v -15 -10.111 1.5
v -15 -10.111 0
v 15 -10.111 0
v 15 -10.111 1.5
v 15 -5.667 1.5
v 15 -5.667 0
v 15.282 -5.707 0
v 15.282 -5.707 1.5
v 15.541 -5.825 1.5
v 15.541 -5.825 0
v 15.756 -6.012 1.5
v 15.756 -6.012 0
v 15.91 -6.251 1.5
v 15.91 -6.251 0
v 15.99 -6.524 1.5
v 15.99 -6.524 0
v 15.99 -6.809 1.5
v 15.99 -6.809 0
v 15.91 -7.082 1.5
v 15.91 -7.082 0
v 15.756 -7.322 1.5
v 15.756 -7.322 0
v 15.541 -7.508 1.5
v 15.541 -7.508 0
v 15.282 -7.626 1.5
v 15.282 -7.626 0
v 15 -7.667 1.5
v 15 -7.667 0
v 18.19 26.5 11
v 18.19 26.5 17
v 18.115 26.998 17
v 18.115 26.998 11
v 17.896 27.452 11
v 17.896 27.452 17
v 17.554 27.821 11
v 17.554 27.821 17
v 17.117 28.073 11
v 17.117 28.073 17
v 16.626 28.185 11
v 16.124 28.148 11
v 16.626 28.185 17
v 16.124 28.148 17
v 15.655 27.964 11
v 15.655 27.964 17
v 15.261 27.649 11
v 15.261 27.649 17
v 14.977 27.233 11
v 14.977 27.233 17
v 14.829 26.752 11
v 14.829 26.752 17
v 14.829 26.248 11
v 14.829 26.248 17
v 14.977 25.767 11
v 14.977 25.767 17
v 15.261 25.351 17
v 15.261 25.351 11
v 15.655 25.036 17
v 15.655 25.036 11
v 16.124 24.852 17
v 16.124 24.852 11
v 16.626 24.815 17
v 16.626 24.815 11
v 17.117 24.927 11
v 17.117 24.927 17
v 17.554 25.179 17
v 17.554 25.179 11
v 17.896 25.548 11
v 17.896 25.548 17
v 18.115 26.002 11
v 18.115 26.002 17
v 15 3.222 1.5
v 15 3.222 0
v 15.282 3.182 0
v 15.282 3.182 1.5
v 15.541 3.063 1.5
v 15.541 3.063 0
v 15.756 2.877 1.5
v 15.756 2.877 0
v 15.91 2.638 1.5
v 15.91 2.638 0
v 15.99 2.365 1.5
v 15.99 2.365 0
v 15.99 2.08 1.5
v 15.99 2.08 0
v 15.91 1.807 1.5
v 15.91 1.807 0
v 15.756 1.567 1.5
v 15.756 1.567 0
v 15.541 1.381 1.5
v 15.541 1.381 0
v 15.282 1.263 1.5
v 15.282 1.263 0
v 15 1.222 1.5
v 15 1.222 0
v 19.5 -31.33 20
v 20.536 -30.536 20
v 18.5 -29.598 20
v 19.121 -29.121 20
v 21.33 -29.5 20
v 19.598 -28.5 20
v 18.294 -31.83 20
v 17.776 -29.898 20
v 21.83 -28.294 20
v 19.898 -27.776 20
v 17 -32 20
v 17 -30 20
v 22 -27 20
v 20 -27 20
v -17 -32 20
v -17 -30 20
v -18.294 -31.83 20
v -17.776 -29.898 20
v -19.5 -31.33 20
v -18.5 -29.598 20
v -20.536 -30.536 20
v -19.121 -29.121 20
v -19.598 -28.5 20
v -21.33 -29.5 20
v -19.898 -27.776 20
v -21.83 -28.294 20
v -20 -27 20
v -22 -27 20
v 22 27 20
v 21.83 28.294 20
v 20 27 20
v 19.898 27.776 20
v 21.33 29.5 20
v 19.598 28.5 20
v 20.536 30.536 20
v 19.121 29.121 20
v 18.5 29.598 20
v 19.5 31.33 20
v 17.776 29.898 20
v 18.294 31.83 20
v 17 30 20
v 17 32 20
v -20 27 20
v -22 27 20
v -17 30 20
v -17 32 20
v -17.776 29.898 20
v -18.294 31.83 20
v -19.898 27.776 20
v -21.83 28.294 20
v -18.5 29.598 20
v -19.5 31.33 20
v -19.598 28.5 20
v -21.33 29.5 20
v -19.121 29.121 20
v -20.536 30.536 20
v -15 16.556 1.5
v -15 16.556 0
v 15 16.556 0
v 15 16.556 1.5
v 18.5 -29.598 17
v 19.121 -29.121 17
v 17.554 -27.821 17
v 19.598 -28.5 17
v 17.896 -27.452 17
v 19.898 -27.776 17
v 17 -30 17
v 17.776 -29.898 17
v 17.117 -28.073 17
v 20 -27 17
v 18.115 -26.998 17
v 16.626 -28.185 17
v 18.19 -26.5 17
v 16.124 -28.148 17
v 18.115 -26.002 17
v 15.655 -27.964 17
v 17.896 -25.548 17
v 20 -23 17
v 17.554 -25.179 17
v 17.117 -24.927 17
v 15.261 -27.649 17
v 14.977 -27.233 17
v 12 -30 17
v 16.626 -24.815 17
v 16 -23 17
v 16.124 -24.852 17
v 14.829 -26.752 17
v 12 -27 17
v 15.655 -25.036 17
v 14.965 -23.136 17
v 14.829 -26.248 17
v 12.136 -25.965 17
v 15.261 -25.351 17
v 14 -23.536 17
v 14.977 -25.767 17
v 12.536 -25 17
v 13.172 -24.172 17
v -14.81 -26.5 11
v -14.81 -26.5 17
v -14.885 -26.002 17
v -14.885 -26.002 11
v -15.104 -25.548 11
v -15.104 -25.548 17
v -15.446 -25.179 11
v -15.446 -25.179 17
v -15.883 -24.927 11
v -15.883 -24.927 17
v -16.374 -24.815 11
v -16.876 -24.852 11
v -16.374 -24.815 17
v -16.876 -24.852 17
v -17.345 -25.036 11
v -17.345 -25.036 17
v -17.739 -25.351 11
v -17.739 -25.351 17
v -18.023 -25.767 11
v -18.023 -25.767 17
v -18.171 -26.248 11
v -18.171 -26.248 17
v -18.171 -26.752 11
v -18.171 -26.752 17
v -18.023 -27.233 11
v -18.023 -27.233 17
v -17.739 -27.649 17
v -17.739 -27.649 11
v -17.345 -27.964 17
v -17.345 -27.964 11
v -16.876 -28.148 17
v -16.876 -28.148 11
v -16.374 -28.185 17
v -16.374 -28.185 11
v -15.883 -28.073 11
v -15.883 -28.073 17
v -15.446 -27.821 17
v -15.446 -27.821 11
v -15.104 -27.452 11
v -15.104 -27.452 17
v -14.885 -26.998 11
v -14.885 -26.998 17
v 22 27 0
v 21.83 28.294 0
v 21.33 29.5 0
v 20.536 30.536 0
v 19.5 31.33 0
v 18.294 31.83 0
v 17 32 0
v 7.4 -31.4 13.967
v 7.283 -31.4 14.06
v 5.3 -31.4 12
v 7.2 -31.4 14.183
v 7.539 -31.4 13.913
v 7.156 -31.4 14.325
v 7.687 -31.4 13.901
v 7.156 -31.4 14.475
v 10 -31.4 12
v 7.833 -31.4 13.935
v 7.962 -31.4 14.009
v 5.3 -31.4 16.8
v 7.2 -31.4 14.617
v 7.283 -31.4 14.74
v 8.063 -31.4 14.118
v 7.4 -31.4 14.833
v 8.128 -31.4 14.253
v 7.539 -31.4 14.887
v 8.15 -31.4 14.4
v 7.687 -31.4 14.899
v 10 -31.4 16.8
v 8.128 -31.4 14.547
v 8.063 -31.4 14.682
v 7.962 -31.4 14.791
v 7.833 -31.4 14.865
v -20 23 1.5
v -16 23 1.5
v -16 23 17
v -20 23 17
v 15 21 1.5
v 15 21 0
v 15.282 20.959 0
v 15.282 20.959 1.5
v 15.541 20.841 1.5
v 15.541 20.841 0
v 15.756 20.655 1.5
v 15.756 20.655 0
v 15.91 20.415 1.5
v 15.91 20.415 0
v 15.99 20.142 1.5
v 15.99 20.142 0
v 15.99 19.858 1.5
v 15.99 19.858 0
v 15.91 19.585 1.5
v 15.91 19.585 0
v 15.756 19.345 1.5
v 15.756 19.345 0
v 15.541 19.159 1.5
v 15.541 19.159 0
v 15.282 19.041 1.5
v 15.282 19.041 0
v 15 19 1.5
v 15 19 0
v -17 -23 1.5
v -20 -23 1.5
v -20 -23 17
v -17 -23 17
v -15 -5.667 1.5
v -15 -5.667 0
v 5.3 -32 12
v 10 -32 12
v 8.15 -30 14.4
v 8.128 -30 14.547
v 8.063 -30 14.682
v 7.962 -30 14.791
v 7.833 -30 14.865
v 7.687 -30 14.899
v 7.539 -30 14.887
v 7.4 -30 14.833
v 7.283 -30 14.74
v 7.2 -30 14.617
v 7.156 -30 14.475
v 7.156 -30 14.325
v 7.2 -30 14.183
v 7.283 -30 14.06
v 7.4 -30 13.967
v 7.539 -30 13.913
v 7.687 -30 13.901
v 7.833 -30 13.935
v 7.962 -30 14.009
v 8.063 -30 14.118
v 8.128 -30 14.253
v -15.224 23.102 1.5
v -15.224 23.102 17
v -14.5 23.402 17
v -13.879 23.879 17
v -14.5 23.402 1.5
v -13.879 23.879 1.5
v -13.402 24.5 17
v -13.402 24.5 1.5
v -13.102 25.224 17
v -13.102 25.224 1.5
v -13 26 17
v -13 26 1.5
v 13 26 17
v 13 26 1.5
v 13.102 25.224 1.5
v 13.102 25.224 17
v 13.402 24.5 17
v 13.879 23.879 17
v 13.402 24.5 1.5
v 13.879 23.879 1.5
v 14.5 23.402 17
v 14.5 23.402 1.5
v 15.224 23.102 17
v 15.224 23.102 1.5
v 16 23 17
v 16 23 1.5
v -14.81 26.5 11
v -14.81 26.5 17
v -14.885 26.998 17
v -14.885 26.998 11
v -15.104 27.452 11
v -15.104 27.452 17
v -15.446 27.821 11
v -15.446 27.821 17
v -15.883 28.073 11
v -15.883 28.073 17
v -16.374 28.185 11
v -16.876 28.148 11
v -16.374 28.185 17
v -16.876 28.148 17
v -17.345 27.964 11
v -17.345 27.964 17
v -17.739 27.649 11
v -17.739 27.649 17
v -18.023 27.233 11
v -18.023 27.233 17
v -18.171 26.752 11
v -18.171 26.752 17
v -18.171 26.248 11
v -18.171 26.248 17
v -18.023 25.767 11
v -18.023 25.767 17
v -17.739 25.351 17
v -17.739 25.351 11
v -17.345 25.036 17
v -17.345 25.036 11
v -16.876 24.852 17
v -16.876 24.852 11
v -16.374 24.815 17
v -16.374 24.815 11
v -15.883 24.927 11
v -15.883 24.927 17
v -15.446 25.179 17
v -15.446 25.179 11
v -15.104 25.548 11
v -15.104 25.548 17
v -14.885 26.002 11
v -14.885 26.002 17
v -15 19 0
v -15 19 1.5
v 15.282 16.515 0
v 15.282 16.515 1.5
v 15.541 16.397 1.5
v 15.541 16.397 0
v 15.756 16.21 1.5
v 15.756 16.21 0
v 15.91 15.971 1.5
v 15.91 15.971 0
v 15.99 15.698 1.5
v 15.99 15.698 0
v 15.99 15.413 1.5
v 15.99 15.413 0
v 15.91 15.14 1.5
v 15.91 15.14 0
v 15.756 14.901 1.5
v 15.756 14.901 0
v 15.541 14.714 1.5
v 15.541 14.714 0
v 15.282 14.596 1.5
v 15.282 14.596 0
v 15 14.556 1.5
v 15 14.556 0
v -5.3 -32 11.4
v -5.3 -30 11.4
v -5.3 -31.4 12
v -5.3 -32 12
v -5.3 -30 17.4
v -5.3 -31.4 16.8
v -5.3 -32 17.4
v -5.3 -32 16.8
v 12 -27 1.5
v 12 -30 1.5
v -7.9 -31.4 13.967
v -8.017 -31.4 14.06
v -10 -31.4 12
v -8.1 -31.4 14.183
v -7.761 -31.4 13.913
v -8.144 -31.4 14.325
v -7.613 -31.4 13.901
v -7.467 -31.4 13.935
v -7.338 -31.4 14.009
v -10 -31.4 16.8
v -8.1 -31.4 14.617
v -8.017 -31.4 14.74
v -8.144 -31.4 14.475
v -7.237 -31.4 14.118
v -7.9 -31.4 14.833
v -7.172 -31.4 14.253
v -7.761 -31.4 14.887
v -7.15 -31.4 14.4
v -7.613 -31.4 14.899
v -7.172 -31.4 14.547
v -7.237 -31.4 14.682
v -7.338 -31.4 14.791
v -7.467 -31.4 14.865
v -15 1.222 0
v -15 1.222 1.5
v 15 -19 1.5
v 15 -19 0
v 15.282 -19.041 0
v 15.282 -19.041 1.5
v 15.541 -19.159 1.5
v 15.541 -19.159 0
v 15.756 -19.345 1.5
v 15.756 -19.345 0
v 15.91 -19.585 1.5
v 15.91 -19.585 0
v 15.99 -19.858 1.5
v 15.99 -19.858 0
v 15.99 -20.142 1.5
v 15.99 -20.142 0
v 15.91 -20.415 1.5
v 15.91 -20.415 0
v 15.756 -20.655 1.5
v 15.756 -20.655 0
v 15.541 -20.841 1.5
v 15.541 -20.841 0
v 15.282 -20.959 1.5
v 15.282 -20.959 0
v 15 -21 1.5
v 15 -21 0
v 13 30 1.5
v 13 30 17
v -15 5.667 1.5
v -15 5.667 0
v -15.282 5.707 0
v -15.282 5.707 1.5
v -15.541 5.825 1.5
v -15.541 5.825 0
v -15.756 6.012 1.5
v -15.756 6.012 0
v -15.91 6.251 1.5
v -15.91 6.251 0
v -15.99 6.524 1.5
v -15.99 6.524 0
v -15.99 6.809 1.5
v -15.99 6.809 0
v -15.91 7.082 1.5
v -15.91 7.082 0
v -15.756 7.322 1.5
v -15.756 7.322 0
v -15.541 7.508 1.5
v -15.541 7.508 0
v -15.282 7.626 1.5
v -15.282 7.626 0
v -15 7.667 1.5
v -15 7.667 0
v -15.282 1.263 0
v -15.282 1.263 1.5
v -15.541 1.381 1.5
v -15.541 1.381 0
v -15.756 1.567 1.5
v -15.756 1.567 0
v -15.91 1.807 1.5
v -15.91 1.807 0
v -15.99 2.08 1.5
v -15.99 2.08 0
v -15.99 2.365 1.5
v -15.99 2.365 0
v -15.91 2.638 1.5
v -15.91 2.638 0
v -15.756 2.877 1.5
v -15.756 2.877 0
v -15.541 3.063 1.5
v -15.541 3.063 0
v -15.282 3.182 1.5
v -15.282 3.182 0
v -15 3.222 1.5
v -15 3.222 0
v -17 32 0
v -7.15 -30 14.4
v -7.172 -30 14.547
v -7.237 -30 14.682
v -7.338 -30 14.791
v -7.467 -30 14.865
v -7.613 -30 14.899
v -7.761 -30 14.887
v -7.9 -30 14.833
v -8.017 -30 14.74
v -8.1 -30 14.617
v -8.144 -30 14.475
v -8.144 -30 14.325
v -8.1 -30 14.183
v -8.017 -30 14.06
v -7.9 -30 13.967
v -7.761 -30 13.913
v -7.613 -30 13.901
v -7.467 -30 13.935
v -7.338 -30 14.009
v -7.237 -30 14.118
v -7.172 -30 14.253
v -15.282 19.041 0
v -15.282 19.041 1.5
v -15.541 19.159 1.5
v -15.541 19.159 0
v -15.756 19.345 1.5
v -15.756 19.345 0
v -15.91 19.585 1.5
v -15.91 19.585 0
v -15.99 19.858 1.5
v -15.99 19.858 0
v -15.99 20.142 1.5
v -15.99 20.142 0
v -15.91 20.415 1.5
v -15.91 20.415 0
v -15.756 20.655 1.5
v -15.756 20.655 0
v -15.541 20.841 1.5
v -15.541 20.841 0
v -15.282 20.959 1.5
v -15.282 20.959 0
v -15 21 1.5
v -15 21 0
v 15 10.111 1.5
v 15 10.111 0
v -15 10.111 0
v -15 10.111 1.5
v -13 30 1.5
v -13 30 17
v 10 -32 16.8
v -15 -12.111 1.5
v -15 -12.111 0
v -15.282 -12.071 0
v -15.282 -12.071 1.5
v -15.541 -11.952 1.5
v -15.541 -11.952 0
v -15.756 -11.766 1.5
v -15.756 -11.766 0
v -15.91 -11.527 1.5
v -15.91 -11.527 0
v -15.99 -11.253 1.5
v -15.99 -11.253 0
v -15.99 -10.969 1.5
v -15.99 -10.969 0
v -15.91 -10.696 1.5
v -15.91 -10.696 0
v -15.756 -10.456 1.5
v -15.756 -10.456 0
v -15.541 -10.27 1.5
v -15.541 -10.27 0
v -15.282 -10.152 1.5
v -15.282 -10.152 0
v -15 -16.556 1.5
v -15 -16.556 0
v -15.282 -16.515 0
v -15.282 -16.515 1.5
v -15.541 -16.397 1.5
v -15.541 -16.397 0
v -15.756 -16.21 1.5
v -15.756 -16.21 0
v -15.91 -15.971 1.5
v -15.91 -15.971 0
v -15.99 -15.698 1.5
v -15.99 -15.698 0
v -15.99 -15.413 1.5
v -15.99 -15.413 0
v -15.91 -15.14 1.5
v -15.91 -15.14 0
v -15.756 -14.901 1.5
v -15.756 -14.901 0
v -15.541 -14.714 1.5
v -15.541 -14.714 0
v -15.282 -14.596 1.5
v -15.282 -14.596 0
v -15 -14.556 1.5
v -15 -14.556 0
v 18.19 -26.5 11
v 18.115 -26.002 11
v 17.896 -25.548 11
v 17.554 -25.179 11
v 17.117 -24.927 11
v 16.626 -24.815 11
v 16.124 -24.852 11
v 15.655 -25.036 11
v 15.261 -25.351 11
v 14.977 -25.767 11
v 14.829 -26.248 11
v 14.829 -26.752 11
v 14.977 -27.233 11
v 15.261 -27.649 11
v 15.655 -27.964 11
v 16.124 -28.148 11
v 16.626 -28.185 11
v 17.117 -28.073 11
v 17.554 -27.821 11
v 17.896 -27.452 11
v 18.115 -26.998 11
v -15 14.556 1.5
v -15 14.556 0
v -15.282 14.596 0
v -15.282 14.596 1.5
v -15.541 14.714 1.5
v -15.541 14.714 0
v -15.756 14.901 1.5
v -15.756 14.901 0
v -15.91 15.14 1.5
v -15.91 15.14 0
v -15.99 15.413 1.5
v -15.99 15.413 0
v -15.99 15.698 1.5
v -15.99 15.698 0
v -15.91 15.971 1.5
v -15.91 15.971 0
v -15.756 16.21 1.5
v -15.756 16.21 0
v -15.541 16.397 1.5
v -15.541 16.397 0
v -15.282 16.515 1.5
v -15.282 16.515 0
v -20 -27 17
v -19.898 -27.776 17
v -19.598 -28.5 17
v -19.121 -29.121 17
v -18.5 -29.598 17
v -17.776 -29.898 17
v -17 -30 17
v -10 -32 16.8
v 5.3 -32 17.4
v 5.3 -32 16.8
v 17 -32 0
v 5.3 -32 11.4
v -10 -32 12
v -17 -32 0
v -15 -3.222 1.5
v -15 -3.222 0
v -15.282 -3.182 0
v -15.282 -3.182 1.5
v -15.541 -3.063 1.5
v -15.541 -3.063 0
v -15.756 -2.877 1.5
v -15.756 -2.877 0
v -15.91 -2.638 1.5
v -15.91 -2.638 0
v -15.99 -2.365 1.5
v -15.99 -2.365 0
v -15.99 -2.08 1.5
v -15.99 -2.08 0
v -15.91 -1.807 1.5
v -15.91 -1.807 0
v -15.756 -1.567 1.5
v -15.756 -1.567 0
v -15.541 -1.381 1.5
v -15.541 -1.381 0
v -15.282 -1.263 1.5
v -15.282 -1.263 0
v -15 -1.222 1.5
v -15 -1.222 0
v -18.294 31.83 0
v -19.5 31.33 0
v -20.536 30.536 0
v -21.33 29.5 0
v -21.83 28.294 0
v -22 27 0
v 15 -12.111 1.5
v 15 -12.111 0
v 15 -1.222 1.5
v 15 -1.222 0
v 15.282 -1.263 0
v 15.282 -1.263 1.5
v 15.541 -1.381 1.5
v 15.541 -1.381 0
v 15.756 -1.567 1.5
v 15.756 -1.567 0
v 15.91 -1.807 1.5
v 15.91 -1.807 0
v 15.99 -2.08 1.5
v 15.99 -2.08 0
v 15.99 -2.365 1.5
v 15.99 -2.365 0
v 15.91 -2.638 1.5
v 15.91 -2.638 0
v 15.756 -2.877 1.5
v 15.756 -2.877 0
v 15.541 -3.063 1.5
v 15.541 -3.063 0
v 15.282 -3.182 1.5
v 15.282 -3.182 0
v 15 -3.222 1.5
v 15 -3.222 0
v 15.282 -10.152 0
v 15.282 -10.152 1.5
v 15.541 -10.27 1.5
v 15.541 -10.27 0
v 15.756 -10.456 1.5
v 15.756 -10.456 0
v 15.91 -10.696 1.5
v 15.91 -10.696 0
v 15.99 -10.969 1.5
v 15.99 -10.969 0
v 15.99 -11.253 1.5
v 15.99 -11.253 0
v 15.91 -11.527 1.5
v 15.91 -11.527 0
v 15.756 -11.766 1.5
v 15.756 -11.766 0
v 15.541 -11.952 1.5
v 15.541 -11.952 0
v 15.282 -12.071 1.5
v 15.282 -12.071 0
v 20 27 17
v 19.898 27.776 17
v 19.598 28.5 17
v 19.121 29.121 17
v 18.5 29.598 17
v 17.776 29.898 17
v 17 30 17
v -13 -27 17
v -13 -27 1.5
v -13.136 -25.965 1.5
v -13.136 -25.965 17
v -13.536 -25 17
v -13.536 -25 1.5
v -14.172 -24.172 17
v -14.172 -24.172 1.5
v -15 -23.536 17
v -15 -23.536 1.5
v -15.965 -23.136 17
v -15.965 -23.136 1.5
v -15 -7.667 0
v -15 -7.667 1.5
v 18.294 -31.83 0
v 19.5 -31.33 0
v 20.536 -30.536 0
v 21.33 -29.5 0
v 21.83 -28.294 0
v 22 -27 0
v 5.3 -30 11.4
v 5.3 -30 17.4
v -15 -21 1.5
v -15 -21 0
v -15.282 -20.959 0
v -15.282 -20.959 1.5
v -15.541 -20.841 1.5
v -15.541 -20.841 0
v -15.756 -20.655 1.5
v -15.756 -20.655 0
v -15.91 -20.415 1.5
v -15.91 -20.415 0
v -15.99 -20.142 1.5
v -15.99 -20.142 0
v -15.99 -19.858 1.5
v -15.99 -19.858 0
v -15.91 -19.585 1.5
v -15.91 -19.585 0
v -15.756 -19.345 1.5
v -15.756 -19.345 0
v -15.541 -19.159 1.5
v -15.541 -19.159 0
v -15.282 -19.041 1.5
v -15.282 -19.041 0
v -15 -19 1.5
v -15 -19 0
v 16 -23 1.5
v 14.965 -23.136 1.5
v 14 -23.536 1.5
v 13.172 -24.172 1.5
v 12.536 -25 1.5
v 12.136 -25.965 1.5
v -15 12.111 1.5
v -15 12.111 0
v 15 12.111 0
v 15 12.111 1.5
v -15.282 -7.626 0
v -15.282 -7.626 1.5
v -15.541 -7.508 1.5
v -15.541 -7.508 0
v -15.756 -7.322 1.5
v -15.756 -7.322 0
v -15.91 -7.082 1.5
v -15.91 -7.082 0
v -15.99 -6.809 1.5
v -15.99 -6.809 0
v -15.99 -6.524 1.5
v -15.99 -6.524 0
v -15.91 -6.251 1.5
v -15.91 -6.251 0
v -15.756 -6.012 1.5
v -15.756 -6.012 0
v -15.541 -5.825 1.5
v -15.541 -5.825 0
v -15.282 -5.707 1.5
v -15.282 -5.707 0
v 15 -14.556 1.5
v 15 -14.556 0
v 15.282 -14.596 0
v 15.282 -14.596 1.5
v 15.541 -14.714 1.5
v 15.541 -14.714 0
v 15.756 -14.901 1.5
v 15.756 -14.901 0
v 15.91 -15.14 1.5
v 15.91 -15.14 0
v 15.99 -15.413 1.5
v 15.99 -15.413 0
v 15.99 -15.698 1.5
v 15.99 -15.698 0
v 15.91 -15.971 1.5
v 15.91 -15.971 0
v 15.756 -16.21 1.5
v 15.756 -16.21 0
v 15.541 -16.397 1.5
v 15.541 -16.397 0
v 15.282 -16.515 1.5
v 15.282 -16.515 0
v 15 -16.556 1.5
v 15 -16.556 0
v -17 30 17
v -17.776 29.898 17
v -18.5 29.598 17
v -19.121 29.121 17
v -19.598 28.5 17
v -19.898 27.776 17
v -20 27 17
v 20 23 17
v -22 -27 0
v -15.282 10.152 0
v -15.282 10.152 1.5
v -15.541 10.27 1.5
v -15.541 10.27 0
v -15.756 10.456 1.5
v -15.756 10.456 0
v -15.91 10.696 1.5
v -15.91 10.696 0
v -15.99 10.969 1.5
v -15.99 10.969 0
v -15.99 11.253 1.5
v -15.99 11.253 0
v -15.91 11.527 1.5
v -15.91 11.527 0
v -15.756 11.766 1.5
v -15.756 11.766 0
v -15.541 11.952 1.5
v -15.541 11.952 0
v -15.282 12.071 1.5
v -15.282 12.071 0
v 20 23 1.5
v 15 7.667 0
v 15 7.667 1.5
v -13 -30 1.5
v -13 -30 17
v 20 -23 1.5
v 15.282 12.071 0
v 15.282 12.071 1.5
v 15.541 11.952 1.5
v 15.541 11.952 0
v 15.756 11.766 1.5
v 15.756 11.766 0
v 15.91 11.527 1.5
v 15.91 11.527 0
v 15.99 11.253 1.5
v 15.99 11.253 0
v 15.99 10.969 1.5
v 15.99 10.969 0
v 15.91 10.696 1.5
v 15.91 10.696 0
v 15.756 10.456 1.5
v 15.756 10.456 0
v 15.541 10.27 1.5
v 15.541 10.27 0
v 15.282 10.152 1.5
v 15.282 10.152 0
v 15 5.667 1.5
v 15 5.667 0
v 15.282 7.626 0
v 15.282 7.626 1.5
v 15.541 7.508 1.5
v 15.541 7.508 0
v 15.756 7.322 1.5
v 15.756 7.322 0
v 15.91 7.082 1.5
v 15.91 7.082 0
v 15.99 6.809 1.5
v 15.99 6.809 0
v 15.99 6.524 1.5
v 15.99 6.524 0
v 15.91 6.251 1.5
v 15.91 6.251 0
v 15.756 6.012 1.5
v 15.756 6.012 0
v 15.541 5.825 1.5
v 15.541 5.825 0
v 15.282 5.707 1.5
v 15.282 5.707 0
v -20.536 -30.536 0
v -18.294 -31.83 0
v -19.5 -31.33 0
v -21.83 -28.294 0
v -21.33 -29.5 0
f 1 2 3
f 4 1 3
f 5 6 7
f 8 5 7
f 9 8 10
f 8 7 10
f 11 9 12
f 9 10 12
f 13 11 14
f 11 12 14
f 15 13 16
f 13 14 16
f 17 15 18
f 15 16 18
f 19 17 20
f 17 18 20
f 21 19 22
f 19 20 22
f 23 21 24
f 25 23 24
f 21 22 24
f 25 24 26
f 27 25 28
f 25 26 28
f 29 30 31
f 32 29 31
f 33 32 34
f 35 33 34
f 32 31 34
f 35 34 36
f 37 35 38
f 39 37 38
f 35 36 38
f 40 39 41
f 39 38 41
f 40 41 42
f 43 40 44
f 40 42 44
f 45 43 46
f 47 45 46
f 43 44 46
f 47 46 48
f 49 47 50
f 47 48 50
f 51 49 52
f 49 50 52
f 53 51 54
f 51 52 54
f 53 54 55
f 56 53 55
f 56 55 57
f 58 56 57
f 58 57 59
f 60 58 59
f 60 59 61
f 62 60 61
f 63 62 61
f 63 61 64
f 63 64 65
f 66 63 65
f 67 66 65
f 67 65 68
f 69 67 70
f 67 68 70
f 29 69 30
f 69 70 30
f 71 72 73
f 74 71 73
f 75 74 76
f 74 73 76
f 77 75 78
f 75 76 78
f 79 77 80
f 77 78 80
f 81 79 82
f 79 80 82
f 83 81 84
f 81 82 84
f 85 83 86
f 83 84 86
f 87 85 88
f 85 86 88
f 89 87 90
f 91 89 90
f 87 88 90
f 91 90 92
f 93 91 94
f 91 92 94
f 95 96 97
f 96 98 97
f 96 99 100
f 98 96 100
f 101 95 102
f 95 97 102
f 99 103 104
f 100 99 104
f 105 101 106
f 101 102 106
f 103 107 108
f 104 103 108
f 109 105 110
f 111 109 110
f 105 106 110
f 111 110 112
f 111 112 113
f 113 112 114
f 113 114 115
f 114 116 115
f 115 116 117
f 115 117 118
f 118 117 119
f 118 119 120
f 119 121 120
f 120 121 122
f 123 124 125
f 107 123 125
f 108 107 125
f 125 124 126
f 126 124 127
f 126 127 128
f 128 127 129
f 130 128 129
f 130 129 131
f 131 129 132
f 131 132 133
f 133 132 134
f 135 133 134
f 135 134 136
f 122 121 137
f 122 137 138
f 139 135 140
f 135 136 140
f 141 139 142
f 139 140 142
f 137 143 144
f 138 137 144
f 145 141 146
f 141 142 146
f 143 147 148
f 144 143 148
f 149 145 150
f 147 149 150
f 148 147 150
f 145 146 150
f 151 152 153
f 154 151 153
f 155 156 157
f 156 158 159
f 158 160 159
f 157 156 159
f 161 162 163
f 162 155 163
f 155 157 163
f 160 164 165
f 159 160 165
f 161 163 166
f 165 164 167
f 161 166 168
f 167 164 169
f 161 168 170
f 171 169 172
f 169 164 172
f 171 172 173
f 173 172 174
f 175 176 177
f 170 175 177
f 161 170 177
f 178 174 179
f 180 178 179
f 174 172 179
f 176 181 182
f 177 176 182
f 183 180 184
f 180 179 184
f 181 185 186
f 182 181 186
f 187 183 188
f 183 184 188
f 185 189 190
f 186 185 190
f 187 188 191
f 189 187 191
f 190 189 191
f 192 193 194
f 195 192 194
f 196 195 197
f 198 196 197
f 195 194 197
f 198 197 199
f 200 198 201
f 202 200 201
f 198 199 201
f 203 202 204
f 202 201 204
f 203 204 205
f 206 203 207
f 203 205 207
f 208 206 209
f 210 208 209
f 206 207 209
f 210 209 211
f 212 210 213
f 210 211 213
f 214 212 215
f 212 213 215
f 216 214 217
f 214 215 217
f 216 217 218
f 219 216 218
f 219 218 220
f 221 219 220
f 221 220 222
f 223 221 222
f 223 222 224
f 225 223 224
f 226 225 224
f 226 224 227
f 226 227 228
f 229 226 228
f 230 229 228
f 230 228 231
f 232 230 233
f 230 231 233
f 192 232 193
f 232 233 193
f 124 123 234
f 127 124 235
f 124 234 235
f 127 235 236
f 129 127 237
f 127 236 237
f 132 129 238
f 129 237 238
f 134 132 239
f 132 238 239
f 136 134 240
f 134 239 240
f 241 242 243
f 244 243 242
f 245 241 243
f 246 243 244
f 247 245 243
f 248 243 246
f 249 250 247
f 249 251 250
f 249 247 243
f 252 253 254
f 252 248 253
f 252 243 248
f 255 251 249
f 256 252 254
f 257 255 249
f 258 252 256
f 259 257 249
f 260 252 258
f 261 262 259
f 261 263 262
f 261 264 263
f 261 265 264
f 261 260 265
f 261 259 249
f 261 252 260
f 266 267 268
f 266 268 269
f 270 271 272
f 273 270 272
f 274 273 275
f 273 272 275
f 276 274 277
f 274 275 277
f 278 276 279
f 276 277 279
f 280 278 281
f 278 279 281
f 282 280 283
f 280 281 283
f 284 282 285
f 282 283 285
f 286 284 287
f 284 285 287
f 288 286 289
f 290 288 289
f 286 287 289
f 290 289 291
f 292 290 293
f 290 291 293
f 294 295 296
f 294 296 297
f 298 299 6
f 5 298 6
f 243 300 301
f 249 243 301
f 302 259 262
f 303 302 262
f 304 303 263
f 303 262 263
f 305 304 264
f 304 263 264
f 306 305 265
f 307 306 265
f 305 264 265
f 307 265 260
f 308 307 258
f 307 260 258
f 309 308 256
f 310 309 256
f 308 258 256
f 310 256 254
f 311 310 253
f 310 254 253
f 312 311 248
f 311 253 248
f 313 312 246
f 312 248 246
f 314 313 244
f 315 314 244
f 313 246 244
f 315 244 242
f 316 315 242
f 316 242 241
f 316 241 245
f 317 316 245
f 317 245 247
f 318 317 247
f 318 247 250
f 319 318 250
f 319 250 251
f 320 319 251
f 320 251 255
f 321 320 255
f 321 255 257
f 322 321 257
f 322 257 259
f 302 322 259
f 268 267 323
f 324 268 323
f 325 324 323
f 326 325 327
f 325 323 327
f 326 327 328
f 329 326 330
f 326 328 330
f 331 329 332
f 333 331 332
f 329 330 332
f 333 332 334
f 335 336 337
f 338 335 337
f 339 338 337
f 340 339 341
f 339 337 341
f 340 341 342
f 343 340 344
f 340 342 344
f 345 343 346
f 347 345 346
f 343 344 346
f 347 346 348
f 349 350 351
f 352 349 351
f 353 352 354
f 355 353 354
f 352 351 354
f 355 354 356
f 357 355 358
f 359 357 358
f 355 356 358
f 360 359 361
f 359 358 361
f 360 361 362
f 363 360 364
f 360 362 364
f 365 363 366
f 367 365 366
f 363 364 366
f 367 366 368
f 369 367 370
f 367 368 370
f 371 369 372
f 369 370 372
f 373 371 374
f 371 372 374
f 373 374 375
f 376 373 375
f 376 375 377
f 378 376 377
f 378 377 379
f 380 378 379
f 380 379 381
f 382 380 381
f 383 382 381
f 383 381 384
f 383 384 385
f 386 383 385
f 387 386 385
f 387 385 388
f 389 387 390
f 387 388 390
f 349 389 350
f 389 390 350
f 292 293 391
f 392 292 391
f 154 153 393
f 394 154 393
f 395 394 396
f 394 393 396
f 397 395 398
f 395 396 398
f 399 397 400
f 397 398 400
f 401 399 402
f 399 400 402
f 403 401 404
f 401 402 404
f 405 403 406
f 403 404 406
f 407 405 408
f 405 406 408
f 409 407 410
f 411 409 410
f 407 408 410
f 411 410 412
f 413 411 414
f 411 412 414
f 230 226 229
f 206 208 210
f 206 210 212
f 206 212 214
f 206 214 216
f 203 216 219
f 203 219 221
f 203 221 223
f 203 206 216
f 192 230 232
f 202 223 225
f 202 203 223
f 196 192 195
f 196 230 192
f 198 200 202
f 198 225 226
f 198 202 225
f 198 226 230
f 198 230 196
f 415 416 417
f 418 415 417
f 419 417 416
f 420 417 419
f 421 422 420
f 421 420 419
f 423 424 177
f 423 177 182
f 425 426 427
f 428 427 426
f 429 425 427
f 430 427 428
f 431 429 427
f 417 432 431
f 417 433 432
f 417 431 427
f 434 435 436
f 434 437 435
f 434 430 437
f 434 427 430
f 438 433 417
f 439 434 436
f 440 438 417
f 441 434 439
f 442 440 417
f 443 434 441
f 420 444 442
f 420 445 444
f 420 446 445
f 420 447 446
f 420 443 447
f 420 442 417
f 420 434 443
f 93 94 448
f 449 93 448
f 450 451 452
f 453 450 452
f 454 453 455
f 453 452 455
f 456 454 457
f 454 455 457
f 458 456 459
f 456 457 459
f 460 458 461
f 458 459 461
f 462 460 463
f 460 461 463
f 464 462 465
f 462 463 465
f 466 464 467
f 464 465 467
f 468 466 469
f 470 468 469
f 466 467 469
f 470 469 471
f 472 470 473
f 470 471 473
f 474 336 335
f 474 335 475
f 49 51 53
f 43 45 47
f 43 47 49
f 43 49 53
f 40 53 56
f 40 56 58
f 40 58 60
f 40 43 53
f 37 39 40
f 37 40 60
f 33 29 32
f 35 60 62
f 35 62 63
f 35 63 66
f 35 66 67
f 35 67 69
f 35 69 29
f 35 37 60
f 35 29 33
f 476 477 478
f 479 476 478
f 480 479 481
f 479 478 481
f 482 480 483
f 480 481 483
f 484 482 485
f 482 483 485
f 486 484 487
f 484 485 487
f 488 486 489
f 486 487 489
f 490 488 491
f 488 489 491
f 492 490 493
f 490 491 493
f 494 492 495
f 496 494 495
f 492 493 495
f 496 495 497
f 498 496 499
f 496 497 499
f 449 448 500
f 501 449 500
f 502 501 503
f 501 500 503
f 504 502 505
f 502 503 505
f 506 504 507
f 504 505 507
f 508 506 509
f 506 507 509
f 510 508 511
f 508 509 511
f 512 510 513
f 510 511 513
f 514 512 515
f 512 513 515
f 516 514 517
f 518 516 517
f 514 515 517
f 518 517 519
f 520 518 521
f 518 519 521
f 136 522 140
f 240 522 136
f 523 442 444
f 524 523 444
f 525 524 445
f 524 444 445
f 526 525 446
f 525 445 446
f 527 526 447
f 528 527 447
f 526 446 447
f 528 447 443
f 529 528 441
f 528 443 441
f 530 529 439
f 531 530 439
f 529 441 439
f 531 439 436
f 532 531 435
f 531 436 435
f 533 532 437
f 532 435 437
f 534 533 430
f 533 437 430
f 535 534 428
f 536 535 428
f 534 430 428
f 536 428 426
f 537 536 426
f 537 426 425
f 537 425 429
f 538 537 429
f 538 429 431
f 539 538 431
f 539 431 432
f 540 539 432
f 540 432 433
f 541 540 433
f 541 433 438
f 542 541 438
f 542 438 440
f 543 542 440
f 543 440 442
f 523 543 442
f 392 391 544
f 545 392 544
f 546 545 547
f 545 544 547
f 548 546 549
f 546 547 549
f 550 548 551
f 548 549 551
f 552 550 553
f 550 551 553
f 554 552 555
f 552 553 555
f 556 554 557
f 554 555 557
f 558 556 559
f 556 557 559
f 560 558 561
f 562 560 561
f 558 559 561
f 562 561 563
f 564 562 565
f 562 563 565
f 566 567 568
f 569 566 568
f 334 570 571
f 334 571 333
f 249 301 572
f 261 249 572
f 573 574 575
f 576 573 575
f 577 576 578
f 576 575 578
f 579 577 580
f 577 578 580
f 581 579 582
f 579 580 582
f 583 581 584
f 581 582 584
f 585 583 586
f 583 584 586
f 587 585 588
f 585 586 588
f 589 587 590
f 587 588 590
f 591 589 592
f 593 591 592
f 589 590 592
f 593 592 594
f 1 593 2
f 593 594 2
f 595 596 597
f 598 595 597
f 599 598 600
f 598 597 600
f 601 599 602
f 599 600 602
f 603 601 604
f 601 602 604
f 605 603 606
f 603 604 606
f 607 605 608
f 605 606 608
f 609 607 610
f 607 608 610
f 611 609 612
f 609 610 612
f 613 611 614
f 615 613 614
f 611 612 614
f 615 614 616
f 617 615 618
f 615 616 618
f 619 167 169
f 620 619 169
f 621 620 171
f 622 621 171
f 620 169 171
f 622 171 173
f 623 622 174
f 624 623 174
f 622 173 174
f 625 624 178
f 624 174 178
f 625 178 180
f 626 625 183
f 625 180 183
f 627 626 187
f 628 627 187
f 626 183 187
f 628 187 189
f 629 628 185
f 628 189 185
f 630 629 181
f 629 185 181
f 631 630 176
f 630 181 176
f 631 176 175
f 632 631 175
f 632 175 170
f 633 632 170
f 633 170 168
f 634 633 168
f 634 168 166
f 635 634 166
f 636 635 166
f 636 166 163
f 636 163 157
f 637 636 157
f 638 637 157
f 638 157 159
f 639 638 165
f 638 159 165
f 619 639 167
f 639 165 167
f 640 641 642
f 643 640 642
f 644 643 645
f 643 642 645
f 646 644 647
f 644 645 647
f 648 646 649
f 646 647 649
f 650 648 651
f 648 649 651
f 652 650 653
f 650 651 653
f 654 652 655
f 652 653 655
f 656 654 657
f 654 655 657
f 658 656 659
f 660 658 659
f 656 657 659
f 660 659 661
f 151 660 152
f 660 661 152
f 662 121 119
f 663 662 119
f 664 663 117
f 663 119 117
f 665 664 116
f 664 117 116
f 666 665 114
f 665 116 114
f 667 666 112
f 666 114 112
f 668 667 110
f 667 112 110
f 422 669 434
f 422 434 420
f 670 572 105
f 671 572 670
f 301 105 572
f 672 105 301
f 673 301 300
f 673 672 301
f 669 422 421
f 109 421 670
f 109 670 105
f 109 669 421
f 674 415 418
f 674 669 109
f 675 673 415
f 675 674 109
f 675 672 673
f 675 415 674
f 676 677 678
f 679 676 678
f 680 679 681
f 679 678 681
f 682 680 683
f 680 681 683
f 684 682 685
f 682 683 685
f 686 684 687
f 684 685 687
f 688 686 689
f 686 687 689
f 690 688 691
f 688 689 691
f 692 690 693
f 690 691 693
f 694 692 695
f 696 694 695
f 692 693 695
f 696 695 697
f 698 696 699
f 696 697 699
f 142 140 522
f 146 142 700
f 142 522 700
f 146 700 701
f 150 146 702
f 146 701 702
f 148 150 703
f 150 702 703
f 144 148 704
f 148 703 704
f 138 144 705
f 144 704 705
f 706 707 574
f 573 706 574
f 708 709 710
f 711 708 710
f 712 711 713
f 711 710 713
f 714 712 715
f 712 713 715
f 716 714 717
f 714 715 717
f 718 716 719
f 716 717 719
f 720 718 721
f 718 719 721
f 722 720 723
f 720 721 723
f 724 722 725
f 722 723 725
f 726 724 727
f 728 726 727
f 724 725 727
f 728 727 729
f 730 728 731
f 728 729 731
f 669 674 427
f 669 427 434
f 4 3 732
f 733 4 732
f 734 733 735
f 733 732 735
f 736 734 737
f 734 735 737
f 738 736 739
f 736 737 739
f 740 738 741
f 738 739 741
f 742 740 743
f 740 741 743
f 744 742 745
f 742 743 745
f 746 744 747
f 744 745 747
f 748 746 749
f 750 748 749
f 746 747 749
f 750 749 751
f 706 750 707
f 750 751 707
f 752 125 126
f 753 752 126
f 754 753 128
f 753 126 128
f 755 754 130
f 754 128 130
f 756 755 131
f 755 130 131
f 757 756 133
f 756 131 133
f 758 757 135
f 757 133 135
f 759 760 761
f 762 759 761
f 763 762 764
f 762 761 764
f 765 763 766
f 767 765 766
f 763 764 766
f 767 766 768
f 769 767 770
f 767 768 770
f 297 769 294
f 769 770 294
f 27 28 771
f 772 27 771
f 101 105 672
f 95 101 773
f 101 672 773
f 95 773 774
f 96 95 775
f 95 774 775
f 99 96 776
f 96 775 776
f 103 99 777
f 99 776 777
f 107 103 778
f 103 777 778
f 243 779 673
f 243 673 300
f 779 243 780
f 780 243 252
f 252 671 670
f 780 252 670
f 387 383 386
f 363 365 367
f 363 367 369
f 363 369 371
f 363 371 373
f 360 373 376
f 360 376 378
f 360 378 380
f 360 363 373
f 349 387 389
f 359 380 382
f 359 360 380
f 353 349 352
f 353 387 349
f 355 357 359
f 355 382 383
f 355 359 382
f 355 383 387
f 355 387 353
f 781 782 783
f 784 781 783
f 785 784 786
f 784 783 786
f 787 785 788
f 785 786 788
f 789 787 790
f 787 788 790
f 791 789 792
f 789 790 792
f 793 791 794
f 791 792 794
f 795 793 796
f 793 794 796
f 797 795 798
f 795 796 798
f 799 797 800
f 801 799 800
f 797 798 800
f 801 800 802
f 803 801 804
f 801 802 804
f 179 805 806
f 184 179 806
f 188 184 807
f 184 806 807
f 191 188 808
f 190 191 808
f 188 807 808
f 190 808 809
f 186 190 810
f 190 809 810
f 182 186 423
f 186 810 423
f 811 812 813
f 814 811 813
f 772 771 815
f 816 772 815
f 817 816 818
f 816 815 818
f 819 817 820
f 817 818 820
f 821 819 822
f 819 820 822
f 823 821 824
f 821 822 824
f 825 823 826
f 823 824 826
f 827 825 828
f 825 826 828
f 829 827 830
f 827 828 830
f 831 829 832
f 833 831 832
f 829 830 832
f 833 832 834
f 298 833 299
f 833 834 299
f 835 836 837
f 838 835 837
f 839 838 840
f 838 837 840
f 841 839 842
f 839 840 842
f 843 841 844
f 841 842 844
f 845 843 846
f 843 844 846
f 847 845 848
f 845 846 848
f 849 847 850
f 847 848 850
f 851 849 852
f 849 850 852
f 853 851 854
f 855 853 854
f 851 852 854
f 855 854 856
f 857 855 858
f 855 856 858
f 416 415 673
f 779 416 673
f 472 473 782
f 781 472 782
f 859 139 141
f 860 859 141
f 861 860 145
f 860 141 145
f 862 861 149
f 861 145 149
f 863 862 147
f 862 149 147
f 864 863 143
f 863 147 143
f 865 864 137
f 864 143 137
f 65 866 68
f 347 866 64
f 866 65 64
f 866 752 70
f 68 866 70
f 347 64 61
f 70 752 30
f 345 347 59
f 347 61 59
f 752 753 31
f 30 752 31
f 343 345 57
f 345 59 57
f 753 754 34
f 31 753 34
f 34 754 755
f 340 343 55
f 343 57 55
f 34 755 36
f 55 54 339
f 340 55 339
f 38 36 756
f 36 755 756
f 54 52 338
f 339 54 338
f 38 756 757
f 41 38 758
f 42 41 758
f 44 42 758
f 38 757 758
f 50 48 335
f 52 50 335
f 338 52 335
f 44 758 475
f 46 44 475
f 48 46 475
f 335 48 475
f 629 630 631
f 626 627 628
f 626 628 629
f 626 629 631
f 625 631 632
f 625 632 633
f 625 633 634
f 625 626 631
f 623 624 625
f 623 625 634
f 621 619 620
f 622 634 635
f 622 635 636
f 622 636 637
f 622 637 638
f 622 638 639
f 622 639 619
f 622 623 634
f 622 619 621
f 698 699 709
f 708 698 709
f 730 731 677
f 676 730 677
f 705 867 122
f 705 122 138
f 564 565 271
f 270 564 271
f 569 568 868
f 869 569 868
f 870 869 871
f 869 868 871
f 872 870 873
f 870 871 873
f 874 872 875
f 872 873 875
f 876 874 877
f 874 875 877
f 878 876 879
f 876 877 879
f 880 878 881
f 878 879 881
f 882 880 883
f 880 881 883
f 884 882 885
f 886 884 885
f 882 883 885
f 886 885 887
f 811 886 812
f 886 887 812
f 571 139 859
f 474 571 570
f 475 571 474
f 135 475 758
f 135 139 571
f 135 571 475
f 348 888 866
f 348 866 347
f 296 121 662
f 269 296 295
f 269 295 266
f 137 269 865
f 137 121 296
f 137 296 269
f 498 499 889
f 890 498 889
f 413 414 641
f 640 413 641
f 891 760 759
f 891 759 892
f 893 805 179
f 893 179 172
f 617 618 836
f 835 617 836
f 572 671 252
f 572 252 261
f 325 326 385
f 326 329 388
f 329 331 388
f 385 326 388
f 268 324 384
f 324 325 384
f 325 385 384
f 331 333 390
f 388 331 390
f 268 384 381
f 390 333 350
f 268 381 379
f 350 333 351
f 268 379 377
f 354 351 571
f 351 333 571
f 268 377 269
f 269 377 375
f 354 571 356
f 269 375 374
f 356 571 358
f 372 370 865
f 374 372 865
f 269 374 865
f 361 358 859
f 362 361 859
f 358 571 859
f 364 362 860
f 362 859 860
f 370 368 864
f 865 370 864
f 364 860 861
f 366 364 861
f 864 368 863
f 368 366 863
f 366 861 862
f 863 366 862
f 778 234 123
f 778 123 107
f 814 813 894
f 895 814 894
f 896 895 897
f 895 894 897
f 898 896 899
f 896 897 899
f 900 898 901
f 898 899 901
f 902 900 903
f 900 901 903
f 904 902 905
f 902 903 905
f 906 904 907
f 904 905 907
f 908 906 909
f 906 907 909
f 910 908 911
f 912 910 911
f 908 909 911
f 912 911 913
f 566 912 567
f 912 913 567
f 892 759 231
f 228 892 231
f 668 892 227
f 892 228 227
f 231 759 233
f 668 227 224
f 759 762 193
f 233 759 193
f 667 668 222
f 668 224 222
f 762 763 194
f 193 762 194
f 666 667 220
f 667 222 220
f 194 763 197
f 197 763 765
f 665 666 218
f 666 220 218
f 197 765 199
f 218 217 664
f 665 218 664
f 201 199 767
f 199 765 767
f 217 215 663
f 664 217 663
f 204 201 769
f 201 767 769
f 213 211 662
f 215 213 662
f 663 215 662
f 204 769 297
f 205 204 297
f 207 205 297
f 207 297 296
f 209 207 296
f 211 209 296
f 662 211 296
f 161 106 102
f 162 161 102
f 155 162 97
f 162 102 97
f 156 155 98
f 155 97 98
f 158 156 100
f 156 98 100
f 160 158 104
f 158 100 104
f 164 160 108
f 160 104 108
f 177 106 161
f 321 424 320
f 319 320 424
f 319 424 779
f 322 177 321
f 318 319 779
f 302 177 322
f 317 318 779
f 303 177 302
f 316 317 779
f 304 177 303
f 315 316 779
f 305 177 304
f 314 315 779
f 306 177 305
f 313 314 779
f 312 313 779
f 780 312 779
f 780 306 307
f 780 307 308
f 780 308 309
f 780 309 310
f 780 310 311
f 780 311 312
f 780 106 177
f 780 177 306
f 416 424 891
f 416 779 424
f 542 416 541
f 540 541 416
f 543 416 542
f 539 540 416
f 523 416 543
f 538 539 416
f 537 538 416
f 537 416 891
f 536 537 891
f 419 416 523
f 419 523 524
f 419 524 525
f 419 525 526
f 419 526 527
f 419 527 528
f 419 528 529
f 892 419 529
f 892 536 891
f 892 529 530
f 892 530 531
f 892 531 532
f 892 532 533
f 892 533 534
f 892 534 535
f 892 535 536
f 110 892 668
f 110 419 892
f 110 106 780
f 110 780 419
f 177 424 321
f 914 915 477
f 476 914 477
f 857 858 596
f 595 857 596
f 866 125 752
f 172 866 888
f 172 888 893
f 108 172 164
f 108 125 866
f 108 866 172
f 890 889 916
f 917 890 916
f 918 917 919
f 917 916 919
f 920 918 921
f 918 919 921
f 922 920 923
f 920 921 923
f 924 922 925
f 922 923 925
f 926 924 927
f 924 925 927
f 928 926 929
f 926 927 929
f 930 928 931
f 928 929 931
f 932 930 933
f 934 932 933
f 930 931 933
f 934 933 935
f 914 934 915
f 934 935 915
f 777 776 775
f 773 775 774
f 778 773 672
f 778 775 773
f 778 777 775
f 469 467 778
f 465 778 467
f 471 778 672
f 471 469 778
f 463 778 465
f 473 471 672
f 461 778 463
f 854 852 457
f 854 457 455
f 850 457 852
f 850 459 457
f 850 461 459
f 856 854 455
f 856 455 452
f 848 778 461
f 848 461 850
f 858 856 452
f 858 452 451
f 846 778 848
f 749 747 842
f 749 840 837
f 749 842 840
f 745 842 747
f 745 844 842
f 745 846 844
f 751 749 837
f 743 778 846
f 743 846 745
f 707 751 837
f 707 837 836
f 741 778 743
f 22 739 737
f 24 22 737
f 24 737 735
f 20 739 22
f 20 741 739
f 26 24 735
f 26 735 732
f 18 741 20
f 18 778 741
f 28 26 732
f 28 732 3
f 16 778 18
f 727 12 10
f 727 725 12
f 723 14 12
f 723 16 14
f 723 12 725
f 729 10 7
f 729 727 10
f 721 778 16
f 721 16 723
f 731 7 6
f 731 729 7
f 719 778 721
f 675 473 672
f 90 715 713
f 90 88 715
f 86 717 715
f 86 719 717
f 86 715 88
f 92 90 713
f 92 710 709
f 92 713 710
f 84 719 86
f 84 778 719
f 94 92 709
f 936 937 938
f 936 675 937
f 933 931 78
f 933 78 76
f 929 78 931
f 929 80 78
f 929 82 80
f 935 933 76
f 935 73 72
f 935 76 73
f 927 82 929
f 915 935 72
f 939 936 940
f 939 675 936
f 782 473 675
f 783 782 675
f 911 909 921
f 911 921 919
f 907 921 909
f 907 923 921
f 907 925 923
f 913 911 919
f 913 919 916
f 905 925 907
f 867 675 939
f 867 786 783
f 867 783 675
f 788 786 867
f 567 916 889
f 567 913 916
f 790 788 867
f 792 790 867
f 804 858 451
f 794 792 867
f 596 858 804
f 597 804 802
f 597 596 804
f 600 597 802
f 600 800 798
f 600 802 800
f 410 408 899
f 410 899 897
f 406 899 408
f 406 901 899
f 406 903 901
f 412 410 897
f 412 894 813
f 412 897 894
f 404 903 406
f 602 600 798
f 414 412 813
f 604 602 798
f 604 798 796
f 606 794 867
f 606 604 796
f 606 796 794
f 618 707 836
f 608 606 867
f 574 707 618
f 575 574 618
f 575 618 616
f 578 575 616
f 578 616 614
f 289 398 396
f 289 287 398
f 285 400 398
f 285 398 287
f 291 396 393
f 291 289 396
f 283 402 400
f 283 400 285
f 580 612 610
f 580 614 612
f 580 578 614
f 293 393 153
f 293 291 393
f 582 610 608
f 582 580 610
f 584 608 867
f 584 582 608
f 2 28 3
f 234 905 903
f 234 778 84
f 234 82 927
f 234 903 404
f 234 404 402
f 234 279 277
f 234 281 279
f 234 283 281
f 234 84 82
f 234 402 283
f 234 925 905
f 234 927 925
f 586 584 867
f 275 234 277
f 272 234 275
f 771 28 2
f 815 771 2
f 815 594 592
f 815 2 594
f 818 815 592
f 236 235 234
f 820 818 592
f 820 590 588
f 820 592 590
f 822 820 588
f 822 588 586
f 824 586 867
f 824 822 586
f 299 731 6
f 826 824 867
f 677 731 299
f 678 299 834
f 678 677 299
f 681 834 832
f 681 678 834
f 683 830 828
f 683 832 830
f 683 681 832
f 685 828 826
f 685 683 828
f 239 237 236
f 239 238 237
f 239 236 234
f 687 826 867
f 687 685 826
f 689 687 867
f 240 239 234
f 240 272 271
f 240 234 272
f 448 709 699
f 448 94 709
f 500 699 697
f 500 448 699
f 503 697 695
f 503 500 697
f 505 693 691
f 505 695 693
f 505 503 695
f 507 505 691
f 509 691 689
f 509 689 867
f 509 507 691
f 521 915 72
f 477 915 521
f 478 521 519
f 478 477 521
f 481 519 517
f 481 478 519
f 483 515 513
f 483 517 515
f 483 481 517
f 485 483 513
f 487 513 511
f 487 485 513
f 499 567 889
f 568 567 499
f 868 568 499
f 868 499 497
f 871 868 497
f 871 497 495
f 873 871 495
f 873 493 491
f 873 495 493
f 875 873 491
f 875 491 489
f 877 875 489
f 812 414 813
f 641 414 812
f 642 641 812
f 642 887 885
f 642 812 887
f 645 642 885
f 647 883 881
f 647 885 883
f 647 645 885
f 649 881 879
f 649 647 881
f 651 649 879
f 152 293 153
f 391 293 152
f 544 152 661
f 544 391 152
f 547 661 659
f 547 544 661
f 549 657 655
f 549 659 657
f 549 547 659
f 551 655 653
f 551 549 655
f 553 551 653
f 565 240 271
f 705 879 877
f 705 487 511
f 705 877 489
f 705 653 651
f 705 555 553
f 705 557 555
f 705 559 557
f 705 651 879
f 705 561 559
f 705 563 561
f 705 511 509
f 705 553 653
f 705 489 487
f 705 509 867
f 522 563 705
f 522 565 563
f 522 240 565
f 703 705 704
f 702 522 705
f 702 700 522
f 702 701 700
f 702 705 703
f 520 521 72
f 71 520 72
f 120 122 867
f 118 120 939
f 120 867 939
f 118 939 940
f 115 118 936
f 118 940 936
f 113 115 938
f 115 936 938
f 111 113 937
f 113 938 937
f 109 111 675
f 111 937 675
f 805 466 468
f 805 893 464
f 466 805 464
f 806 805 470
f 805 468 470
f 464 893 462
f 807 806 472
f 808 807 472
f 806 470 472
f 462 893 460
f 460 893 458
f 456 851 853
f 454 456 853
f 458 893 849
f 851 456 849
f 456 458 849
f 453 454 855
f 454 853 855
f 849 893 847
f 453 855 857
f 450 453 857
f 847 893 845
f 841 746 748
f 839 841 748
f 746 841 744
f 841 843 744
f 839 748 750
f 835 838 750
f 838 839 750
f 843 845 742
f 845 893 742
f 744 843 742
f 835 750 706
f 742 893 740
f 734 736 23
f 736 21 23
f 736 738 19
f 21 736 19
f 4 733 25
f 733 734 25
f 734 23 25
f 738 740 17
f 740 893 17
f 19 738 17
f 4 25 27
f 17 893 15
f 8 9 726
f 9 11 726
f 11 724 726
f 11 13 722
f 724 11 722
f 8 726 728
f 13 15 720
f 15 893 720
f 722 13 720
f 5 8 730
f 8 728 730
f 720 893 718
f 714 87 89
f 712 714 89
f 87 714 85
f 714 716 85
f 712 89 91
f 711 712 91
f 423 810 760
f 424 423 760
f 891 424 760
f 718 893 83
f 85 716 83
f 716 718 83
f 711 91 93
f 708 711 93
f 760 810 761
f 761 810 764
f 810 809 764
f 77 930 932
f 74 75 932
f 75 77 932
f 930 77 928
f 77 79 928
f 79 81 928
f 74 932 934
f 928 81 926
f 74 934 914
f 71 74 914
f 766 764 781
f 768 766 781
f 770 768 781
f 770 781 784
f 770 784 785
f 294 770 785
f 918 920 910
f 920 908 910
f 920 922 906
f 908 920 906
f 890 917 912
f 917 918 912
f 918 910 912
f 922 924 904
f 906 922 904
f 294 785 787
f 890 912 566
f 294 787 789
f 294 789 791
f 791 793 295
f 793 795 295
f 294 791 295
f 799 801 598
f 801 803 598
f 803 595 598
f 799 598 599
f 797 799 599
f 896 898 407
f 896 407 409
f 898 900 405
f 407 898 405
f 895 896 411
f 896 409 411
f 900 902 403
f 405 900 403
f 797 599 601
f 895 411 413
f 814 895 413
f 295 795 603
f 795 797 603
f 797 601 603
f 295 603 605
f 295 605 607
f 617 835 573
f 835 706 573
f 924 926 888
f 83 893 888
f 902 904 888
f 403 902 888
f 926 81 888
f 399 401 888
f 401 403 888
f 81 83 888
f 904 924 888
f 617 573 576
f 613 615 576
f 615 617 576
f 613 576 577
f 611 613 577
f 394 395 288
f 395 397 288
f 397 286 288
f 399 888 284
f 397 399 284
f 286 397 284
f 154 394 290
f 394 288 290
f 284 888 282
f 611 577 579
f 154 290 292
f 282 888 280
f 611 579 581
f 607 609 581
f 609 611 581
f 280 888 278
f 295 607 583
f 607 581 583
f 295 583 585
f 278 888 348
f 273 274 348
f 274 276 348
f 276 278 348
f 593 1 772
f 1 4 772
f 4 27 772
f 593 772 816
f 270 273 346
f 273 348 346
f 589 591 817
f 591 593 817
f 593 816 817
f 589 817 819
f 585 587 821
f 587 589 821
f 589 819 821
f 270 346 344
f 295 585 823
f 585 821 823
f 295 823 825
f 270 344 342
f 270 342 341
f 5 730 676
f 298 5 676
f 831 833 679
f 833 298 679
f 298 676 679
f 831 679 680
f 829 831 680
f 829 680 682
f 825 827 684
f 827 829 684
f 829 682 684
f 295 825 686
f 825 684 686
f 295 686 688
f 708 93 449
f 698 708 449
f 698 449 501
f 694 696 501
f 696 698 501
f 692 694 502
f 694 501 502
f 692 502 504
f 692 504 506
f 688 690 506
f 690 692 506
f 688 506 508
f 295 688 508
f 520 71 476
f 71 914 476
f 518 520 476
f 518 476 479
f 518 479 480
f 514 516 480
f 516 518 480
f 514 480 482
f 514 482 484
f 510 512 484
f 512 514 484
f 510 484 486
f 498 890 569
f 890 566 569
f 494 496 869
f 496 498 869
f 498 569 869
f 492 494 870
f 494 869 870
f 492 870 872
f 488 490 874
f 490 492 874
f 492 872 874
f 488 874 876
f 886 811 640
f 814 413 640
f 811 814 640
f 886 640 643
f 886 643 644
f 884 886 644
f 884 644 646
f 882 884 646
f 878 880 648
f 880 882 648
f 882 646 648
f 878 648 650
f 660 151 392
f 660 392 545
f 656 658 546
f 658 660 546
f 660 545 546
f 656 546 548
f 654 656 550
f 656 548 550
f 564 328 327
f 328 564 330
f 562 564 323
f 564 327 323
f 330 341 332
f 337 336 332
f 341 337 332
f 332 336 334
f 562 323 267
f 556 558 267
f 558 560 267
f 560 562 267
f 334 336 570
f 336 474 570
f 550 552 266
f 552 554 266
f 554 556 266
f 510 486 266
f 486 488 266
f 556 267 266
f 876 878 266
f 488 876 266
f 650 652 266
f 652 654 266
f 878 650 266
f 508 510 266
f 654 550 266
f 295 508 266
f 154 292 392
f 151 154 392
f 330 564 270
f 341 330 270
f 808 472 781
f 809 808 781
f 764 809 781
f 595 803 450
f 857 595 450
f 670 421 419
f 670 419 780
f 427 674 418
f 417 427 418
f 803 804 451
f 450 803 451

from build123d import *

# Parameters (mm, degrees)
PAD_DEPTH           = 20
POCKET_DEPTH        = 18.5
POCKET001_DEPTH     = 5
LINEARPATTERN_COUNT = 10
LINEARPATTERN_PITCH = 4.444444
PAD001_DEPTH        = 15.5
SKETCH004_R         = 1.69
POCKET002_DEPTH     = 6
SKETCH005_W         = 20
SKETCH005_H         = 4.8
POCKET003_DEPTH     = 0.6
SKETCH006_R         = 0.5
SKETCH006_W         = 10.6
SKETCH006_H         = 6
POCKET004_DEPTH     = 5


with BuildPart() as part:
    # Sketch → Pad (new body)
    with BuildSketch(Plane.XY):
        with BuildLine():
            Line((-17, 32), (17, 32))
            ThreePointArc((22, 27), (20.535534, 30.535534), (17, 32))
            Line((22, 27), (22, -27))
            ThreePointArc((17, -32), (20.535534, -30.535534), (22, -27))
            Line((17, -32), (-17, -32))
            ThreePointArc((-22, -27), (-20.535534, -30.535534), (-17, -32))
            Line((-22, -27), (-22, 27))
            ThreePointArc((-17, 32), (-20.535534, 30.535534), (-22, 27))
        make_face()
    extrude(amount=PAD_DEPTH)

    # Sketch001 (on Face10 of Pad) → Pocket (cut)
    with BuildSketch(Plane.XY.offset(20)):
        with BuildLine():
            Line((-17, 30), (17, 30))
            ThreePointArc((20, 27), (19.12132, 29.12132), (17, 30))
            Line((20, 27), (20, -27))
            ThreePointArc((17, -30), (19.12132, -29.12132), (20, -27))
            Line((17, -30), (-17, -30))
            ThreePointArc((-20, -27), (-19.12132, -29.12132), (-17, -30))
            Line((-20, -27), (-20, 27))
            ThreePointArc((-17, 30), (-19.12132, 29.12132), (-20, 27))
        make_face()
    extrude(amount=-POCKET_DEPTH, mode=Mode.SUBTRACT)

    # Sketch002 (on Face4 of Pocket) → Pocket001 (cut)
    with BuildSketch(Plane(origin=(0, 0, 0), x_dir=(1, 0, 0), z_dir=(0, 0, -1))):
        with BuildLine():
            ThreePointArc((-15, 21), (-16, 20), (-15, 19))
            Line((-15, 19), (15, 19))
            ThreePointArc((15, 19), (16, 20), (15, 21))
            Line((15, 21), (-15, 21))
        make_face()
    pocket001 = extrude(amount=-POCKET001_DEPTH, mode=Mode.SUBTRACT)

    # LinearPattern: Pocket001 ×10
    with Locations(*[(0, i * LINEARPATTERN_PITCH, 0) for i in range(1, LINEARPATTERN_COUNT)]):
        add(pocket001, mode=Mode.SUBTRACT)

    # Sketch003 (on Face59 of LinearPattern) → Pad001 (join)
    with BuildSketch(Plane.XY.offset(1.5)):
        with BuildLine():
            Line((-17, 30), (-13, 30))
            Line((-13, 30), (-13, 26))
            ThreePointArc((-16, 23), (-13.87868, 23.87868), (-13, 26))
            Line((-16, 23), (-20, 23))
            Line((-20, 27), (-20, 23))
            ThreePointArc((-17, 30), (-19.12132, 29.12132), (-20, 27))
        make_face()
        with BuildLine():
            Line((13, 30), (17, 30))
            ThreePointArc((20, 27), (19.12132, 29.12132), (17, 30))
            Line((20, 27), (20, 23))
            Line((20, 23), (16, 23))
            ThreePointArc((13, 26), (13.87868, 23.87868), (16, 23))
            Line((13, 26), (13, 30))
        make_face()
        with BuildLine():
            Line((-21, -23), (-17, -23))
            ThreePointArc((-13, -27), (-14.171573, -24.171573), (-17, -23))
            Line((-13, -27), (-13, -31))
            Line((-13, -31), (-17, -31))
            ThreePointArc((-21, -27), (-19.828427, -29.828427), (-17, -31))
            Line((-21, -27), (-21, -23))
        make_face()
        with BuildLine():
            Line((16, -23), (20, -23))
            Line((20, -23), (20, -27))
            ThreePointArc((16, -31), (18.828427, -29.828427), (20, -27))
            Line((16, -31), (12, -31))
            Line((12, -31), (12, -27))
            ThreePointArc((16, -23), (13.171573, -24.171573), (12, -27))
        make_face()
    extrude(amount=PAD001_DEPTH)

    # Sketch004 (on Face69 of Pad001) → Pocket002 (cut)
    with BuildSketch(Plane.XY.offset(17)):
        with Locations((16.5, 26.5)):
            Circle(SKETCH004_R)
        with Locations((-16.5, 26.5)):
            Circle(SKETCH004_R)
        with Locations((-16.5, -26.5)):
            Circle(SKETCH004_R)
        with Locations((16.5, -26.5)):
            Circle(SKETCH004_R)
    extrude(amount=-POCKET002_DEPTH, mode=Mode.SUBTRACT)

    # Sketch005 (on Face6 of Pocket002) → Pocket003 (cut)
    with BuildSketch(Plane.XZ.offset(32)):
        with Locations((0, 14.4)):
            Rectangle(SKETCH005_W, SKETCH005_H)
    extrude(amount=-POCKET003_DEPTH, mode=Mode.SUBTRACT)

    # Sketch006 (on Face6 of Pocket003) → Pocket004 (cut)
    with BuildSketch(Plane.XZ.offset(32)):
        with Locations((7.65, 14.4)):
            Circle(SKETCH006_R)
        with Locations((-7.65, 14.4)):
            Circle(SKETCH006_R)
        with Locations((0, 14.4)):
            Rectangle(SKETCH006_W, SKETCH006_H)
    extrude(amount=-POCKET004_DEPTH, mode=Mode.SUBTRACT)


solid = part.part
